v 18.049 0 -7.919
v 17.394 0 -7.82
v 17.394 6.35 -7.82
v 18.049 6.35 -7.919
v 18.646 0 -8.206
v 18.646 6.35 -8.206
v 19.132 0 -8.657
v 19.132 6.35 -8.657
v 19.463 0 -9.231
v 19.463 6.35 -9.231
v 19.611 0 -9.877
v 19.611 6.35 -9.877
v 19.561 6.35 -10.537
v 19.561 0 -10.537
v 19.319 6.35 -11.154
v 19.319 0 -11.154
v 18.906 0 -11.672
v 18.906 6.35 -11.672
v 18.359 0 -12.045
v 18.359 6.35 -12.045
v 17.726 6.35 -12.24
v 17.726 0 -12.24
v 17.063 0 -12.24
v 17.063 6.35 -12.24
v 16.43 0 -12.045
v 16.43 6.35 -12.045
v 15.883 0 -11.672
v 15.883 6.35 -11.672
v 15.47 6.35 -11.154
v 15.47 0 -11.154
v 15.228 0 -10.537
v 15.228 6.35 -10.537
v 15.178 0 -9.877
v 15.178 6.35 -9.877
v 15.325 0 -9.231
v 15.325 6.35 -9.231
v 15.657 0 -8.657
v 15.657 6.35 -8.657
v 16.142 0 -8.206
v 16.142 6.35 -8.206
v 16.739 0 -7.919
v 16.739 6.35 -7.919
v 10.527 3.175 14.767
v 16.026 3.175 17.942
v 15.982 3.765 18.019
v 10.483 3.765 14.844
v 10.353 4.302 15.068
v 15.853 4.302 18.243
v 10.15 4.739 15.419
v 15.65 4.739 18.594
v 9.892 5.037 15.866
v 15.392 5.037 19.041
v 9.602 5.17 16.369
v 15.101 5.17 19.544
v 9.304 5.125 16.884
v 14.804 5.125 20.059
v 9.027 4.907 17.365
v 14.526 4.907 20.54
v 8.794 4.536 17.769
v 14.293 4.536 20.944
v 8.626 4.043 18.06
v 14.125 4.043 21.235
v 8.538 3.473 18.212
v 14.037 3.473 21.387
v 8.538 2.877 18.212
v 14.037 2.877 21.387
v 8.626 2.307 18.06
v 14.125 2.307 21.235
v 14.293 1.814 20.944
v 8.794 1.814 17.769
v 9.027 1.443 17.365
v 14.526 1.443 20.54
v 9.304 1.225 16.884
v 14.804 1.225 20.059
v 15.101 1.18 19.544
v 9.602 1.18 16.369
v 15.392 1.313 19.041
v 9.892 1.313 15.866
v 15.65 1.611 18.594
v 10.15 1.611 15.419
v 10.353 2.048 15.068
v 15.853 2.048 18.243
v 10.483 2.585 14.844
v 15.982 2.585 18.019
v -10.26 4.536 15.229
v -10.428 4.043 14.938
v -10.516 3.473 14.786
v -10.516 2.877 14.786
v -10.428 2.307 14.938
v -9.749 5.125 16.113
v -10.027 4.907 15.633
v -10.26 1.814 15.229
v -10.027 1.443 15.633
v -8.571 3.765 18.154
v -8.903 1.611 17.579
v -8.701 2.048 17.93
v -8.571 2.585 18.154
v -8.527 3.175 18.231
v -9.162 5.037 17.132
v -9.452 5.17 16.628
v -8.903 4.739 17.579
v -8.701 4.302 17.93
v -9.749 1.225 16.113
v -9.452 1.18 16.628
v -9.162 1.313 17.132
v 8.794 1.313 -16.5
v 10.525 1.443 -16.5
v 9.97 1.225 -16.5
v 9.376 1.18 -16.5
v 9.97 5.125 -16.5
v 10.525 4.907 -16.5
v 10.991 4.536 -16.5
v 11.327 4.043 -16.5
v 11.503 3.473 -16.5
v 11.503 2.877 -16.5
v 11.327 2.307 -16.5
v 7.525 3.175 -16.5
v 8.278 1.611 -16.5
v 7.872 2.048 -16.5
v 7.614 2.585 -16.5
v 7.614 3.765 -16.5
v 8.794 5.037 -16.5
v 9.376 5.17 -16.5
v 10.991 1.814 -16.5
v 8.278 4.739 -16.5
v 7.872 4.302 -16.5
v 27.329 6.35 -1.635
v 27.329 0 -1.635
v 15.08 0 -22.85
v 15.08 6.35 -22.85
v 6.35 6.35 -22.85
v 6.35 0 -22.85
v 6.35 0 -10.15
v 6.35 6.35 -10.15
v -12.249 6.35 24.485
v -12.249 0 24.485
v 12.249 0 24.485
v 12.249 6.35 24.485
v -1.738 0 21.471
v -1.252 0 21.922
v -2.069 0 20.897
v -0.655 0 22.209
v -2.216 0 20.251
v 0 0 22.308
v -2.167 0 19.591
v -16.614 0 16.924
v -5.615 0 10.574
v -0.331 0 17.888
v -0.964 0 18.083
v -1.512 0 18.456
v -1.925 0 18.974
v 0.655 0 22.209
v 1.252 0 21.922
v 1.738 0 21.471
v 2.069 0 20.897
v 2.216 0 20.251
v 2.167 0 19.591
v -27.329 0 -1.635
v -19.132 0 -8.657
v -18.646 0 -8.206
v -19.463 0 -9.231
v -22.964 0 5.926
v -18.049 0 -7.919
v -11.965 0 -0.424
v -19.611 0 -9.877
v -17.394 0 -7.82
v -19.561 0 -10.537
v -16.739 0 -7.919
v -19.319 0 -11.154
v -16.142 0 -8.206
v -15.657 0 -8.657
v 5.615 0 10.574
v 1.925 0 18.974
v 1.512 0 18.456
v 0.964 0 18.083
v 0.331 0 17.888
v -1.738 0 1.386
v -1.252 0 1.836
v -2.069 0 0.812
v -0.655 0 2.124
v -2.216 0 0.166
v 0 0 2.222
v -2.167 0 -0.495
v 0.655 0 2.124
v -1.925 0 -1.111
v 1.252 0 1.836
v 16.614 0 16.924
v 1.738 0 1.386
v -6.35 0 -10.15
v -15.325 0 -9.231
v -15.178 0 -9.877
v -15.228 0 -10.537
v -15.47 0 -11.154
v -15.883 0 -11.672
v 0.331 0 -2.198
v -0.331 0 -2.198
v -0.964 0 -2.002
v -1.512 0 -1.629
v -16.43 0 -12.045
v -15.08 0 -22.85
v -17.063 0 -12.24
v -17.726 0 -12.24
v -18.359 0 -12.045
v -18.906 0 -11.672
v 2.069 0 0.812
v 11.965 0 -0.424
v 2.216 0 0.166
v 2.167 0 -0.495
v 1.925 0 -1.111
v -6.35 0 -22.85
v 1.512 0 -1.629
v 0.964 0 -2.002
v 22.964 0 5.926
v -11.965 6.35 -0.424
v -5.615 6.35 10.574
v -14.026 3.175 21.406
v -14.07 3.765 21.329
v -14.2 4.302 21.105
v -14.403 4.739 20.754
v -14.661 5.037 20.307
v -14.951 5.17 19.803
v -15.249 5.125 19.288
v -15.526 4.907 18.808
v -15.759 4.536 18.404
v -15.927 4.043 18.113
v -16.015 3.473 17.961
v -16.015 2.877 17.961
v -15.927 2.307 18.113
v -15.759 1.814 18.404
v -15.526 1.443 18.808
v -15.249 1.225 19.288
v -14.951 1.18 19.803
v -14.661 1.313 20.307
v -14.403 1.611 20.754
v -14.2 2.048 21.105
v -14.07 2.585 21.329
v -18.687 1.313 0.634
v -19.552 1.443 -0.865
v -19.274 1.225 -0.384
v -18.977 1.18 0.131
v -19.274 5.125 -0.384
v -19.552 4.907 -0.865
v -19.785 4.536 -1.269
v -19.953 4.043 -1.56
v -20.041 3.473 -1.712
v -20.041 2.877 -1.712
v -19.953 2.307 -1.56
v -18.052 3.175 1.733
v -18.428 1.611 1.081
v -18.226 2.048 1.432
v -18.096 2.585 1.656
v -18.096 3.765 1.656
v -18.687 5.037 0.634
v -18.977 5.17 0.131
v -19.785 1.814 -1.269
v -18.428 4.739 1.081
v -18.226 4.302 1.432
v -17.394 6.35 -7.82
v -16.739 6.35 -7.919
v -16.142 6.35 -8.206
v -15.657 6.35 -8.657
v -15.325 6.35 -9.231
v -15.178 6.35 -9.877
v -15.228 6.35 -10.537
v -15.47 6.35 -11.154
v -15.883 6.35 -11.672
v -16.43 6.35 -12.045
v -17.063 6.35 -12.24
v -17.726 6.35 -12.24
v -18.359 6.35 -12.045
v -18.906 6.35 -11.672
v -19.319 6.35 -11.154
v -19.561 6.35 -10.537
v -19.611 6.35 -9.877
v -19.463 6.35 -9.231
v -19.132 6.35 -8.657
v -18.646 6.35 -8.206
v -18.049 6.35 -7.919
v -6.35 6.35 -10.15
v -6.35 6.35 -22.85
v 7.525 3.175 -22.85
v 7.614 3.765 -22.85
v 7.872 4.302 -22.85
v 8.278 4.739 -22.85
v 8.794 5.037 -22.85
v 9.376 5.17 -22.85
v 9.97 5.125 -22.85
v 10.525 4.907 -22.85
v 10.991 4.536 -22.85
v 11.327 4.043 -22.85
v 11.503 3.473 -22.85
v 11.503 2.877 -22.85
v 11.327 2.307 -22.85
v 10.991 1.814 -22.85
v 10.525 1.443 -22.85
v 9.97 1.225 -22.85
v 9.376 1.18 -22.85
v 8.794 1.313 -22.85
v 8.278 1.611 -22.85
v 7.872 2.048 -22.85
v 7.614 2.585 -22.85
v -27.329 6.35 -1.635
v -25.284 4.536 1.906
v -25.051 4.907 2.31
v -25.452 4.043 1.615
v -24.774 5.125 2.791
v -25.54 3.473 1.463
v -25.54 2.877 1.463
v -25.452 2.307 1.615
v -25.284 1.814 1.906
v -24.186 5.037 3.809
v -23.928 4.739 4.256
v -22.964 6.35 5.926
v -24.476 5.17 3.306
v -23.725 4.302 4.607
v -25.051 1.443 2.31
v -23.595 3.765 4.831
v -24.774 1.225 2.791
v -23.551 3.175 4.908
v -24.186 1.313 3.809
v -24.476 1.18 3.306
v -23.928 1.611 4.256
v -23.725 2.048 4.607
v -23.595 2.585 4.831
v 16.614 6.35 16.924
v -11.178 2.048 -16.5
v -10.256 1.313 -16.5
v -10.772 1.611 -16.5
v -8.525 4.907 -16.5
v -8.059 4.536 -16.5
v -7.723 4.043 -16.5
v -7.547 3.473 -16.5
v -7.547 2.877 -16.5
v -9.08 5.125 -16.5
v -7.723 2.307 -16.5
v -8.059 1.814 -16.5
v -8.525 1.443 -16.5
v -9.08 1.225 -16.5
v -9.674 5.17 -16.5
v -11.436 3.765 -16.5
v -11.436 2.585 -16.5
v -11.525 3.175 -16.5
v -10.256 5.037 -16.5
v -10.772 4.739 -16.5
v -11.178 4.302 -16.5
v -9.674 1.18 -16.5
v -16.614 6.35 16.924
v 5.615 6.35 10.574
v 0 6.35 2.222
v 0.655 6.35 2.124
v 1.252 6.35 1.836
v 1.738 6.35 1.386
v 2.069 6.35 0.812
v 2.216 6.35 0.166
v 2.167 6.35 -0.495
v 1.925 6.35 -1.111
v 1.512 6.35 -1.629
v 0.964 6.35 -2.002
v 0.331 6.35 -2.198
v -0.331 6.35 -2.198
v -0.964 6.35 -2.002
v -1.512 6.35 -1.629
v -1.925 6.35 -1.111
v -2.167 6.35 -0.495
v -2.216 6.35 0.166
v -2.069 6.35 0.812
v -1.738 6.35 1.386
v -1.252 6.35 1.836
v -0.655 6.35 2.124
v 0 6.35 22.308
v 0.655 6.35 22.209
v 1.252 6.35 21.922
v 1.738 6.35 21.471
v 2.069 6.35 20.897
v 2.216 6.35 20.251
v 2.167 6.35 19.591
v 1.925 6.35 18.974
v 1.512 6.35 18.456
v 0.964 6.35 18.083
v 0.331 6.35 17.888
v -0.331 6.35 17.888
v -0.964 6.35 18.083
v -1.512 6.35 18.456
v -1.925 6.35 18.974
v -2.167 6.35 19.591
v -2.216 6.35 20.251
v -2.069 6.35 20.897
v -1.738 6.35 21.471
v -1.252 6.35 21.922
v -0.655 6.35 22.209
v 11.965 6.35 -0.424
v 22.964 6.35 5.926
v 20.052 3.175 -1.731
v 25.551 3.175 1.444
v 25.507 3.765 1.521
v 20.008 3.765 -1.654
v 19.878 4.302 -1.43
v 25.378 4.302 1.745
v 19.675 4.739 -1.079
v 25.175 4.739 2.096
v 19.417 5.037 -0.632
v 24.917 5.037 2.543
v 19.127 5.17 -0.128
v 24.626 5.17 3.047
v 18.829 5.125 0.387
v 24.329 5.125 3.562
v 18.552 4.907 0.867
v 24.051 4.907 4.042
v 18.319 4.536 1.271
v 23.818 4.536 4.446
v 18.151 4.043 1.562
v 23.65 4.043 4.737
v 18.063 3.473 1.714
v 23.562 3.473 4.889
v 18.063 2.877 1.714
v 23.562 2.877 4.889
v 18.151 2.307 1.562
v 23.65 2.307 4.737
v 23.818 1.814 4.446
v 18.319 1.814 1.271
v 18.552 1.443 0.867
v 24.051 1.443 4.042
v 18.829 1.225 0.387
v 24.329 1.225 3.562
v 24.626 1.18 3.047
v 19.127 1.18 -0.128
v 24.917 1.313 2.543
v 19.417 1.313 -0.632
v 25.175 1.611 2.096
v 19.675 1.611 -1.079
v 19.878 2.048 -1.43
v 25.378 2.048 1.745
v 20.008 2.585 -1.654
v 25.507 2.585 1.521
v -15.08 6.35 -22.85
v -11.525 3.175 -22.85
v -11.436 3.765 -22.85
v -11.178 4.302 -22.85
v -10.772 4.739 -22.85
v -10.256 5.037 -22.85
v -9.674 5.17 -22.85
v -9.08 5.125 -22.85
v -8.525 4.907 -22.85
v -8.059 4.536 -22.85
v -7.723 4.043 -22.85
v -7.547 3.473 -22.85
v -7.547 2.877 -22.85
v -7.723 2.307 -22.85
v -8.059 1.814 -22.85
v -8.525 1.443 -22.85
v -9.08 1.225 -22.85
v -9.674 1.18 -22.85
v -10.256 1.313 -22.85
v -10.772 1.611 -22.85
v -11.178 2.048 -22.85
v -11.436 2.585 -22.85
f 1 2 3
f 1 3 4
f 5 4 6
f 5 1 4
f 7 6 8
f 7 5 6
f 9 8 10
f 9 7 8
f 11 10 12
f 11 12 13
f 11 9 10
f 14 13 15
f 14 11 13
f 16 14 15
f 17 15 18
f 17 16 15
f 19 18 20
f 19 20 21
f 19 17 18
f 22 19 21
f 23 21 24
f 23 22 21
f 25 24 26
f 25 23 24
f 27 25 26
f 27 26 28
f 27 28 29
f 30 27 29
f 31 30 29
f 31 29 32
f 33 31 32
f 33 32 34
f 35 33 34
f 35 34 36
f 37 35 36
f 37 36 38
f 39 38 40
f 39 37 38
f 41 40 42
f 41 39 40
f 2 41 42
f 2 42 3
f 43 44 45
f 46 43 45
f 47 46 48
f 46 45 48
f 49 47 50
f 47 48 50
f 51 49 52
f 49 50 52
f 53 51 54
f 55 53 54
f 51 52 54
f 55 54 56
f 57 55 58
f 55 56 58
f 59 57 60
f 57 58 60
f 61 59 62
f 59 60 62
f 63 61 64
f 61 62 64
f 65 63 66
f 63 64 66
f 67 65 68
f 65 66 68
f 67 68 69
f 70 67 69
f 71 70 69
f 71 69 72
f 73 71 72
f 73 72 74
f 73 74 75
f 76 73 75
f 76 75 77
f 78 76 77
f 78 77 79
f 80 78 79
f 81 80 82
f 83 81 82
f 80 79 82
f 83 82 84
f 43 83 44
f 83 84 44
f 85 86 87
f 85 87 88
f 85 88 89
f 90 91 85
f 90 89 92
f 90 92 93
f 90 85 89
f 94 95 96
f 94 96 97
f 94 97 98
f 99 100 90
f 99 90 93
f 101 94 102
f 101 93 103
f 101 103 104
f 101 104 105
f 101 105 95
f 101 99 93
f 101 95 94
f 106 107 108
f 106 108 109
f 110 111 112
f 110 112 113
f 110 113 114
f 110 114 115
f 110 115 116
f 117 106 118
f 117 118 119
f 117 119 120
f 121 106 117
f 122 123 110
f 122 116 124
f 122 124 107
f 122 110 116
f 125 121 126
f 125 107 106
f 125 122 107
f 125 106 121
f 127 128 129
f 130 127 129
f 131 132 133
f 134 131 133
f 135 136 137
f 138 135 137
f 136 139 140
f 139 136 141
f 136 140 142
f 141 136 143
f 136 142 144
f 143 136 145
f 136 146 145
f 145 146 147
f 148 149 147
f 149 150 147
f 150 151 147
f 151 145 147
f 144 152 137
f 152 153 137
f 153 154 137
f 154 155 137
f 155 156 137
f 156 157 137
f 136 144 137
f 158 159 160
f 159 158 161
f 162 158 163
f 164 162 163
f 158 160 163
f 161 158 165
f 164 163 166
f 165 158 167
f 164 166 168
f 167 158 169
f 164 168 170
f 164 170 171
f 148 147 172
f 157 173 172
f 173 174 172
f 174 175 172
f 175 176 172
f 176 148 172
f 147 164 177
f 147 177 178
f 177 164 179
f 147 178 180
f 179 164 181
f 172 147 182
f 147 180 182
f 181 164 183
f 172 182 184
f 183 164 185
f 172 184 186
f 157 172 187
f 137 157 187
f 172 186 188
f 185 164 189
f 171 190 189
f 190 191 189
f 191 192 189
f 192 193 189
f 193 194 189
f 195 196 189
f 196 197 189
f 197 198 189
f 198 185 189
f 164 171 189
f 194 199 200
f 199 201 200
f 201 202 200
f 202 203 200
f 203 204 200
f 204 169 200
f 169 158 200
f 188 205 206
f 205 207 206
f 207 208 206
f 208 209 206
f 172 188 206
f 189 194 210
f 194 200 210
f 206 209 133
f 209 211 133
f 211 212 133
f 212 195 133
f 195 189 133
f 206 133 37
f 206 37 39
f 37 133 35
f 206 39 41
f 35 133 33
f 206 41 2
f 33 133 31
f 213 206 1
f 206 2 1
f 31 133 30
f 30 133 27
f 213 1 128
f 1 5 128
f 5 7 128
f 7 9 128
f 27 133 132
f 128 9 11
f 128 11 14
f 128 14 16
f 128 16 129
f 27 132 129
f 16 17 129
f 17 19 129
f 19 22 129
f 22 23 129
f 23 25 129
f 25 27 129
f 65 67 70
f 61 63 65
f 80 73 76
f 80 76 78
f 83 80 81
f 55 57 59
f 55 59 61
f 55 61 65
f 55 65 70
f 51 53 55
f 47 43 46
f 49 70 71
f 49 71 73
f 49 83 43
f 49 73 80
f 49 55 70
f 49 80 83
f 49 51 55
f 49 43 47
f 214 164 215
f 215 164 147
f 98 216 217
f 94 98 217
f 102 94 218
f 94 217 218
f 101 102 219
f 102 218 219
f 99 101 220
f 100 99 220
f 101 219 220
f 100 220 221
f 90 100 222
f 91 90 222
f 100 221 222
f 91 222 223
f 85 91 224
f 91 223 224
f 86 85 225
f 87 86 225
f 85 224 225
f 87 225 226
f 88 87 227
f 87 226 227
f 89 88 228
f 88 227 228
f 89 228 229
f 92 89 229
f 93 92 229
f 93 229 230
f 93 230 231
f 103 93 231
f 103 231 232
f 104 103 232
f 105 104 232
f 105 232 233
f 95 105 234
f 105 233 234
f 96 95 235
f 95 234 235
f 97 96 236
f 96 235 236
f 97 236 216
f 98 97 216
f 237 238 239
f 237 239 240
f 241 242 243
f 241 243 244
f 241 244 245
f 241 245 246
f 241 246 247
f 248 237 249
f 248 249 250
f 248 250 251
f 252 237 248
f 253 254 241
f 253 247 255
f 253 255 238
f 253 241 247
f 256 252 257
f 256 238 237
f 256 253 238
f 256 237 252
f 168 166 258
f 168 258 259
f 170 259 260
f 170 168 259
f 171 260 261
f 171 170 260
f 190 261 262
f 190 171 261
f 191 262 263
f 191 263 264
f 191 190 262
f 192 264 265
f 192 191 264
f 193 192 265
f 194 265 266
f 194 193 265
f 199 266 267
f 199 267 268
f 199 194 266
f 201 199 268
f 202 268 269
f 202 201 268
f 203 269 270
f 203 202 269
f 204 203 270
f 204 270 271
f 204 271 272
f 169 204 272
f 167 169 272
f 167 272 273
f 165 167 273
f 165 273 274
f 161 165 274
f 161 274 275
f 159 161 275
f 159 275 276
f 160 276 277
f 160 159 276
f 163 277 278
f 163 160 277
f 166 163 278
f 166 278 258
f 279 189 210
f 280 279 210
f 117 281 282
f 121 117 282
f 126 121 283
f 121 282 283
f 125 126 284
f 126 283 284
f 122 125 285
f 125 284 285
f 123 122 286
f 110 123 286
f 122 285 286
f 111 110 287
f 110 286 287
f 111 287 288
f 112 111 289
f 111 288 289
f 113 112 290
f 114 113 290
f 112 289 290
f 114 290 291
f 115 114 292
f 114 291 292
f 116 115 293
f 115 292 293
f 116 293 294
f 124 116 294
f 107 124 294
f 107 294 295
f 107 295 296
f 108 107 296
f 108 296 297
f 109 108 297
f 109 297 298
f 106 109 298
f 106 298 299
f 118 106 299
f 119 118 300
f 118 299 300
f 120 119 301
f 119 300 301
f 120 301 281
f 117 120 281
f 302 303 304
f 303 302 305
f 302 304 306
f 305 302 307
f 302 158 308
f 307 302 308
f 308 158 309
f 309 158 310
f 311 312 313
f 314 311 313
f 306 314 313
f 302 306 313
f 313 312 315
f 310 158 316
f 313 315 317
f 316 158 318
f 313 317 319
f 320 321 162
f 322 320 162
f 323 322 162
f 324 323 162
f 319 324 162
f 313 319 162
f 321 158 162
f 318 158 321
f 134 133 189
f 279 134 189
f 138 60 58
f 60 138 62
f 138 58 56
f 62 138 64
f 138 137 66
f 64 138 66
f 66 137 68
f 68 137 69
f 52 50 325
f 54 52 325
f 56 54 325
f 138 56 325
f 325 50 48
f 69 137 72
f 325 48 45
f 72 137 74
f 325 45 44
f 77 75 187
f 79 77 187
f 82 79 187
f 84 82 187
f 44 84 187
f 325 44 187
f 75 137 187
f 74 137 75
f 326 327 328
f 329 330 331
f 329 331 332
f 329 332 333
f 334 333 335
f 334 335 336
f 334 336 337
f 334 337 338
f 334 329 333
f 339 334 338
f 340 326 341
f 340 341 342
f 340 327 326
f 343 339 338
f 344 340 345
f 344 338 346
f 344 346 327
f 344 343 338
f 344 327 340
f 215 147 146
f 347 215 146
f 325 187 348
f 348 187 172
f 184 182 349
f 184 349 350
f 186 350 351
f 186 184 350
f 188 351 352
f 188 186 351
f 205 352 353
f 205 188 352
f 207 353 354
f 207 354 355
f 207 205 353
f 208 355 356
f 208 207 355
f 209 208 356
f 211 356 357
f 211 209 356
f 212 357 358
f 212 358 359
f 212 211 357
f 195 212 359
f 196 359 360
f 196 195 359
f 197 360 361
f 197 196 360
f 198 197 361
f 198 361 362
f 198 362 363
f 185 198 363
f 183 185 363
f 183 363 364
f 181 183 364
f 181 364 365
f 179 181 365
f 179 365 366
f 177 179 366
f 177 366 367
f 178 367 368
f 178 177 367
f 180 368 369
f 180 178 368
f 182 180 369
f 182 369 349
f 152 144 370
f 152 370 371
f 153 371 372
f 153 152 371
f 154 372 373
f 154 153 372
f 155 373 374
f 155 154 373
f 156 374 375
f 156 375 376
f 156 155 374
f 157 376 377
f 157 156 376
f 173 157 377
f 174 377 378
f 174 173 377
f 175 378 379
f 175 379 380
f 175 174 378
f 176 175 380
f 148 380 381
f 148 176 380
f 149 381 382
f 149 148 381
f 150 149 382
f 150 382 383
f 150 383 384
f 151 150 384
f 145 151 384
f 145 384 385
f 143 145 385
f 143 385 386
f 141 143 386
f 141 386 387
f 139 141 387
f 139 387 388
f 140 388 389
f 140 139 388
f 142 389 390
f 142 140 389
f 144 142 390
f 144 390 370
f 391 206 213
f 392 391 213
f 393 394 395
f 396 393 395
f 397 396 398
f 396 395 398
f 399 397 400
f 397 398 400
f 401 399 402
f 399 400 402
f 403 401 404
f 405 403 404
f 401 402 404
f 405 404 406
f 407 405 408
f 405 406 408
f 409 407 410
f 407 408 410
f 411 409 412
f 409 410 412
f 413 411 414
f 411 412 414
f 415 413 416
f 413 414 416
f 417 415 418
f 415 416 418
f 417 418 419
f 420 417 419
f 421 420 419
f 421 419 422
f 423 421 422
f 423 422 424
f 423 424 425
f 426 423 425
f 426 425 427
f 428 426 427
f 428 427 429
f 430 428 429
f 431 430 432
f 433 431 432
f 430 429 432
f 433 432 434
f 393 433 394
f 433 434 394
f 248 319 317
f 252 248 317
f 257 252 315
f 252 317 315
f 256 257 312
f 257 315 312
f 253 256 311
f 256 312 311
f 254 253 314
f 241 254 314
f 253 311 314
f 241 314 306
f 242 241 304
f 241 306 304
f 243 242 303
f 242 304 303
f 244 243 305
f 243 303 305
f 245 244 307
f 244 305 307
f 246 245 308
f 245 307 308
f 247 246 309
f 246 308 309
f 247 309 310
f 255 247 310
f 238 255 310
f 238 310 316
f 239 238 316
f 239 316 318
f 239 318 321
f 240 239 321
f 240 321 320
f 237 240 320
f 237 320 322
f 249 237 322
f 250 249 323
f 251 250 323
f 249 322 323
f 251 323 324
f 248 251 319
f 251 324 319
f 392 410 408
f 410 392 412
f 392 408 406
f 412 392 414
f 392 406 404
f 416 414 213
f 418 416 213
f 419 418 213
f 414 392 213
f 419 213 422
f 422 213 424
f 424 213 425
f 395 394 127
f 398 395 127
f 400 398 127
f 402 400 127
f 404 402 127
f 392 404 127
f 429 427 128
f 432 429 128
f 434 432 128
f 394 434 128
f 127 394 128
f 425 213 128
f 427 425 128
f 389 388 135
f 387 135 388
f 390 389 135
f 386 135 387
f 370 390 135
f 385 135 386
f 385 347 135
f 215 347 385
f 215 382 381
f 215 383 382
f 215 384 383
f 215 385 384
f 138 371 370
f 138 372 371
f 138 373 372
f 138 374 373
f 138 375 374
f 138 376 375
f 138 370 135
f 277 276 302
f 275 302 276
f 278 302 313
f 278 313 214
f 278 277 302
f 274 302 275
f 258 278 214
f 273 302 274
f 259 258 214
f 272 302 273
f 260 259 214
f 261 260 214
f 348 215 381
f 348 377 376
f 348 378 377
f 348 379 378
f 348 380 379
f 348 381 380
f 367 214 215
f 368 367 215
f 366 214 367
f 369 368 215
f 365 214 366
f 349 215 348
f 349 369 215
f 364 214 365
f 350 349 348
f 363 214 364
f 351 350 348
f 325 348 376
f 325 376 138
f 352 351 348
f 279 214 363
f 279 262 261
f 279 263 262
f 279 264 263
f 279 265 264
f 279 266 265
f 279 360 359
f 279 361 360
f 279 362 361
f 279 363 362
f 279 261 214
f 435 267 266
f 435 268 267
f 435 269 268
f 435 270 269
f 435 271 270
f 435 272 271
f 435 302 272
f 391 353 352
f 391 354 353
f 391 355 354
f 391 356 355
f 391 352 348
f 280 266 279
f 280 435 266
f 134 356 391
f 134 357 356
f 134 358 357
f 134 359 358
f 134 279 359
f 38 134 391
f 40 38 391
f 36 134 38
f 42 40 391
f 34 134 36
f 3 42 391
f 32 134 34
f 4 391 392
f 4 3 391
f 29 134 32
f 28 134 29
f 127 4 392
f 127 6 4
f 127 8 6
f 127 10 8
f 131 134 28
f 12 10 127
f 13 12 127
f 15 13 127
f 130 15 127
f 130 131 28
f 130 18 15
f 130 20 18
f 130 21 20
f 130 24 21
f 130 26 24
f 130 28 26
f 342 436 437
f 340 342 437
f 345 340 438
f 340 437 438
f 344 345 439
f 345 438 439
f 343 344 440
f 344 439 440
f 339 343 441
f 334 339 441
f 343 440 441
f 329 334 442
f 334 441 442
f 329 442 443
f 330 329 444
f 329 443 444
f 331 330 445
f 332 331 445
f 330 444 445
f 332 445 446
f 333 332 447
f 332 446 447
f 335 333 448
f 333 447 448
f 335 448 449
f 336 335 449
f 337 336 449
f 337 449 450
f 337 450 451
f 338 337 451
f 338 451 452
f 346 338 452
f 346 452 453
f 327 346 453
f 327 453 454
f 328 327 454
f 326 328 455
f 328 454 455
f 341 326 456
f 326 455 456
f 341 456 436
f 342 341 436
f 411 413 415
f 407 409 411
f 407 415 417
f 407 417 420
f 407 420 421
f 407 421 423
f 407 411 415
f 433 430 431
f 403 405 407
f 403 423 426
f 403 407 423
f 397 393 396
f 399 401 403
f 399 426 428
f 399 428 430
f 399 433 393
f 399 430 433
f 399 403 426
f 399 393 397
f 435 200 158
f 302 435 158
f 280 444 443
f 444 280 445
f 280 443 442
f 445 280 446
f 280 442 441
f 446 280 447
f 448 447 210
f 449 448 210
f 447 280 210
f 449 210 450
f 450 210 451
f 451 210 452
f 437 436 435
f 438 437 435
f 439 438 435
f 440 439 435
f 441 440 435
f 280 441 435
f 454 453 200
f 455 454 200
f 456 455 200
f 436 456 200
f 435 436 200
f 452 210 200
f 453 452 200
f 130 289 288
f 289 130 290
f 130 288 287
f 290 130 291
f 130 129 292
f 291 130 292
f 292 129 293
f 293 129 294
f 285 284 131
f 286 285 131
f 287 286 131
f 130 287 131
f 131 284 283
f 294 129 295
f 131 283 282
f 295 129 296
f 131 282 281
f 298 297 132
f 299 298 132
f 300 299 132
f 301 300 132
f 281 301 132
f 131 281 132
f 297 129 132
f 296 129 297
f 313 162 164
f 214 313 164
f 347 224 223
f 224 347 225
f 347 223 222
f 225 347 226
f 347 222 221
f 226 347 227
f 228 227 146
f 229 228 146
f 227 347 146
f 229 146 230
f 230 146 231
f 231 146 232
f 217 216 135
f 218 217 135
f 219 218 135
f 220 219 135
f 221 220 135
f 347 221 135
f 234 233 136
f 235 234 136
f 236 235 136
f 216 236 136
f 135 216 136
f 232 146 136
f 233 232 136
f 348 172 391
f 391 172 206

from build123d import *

# Parameters (mm, degrees)
SKETCH1_R           = 2.2225
BOSS_EXTRUDE3_DEPTH = 6.35
CUT_EXTRUDE1_DEPTH  = 6.35
SKETCH3_R           = 2.00025
CUT_EXTRUDE2_DEPTH  = 6.35
SKETCH4_R           = 2.00025
CUT_EXTRUDE3_DEPTH  = 6.35


with BuildPart() as part:
    # Sketch1 → Boss-Extrude3 (new body)
    with BuildSketch(Plane(origin=(0, 0, 0), x_dir=(1, 0, 0), z_dir=(0, 1, 0))):
        Polygon((-6.35, 10.15), (-6.35, 22.85), (-15.08, 22.85), (-27.328680476, 1.634663089), (-22.963680476, -5.925738686), (-11.965157848, 0.424261314), (-5.615157848, -10.574261314), (-16.613680476, -16.924261314), (-12.248680476, -24.484663089), (12.248680476, -24.484663089), (16.613680476, -16.924261314), (5.615157848, -10.574261314), (11.965157848, 0.424261314), (22.963680476, -5.925738686), (27.328680476, 1.634663089), (15.08, 22.85), (6.35, 22.85), (6.35, 10.15), align=None)
        with Locations(Location((0, -20.085254038, 0), (0, 0, 270))):
            Circle(SKETCH1_R, mode=Mode.SUBTRACT)
        with Locations(Location((17.394340238, 10.042627019, 0), (0, 0, 270))):
            Circle(SKETCH1_R, mode=Mode.SUBTRACT)
        with Locations(Location((-17.394340238, 10.042627019, 0), (0, 0, 270))):
            Circle(SKETCH1_R, mode=Mode.SUBTRACT)
        with Locations(Location((0, 0, 0), (0, 0, 270))):
            Circle(SKETCH1_R, mode=Mode.SUBTRACT)
    extrude(amount=BOSS_EXTRUDE3_DEPTH)

    # Sketch2 → Cut-Extrude1 (cut)
    with BuildSketch(Plane(origin=(19.788680476, 0, 11.425), x_dir=(0.5000000000000057, 0, -0.8660254037844354), z_dir=(0.8660254037844354, 0, 0.5000000000000057))):
        with BuildLine():
            ThreePointArc((-11.52525, 3.175), (-9.525, 1.17475), (-7.52475, 3.175))
            Line((-7.52475, 3.175), (-11.52525, 3.175))
        make_face()
        with BuildLine():
            Line((-11.52525, 3.175), (-7.52475, 3.175))
            ThreePointArc((-7.52475, 3.175), (-9.525, 5.17525), (-11.52525, 3.175))
        make_face()
        with BuildLine():
            ThreePointArc((7.52475, 3.175), (9.525, 1.17475), (11.52525, 3.175))
            Line((11.52525, 3.175), (7.52475, 3.175))
        make_face()
        with BuildLine():
            Line((7.52475, 3.175), (11.52525, 3.175))
            ThreePointArc((11.52525, 3.175), (9.525, 5.17525), (7.52475, 3.175))
        make_face()
    extrude(amount=-CUT_EXTRUDE1_DEPTH, mode=Mode.SUBTRACT)

    # Sketch3 → Cut-Extrude2 (cut)
    with BuildSketch(Plane(origin=(-19.788680476, 0, 11.425), x_dir=(0.5000000000000099, 0, 0.866025403784433), z_dir=(-0.8660254037844329, 0, 0.5000000000000098))):
        with Locations((-9.525, 3.175)):
            Circle(SKETCH3_R)
        with Locations((9.525, 3.175)):
            Circle(SKETCH3_R)
    extrude(amount=-CUT_EXTRUDE2_DEPTH, mode=Mode.SUBTRACT)

    # Sketch4 → Cut-Extrude3 (cut)
    with BuildSketch(Plane(origin=(0, 0, -22.85), x_dir=(-1, 0, 0), z_dir=(0, 0, -1))):
        with Locations((-9.525, 3.175)):
            Circle(SKETCH4_R)
        with Locations((9.525, 3.175)):
            Circle(SKETCH4_R)
    extrude(amount=-CUT_EXTRUDE3_DEPTH, mode=Mode.SUBTRACT)


solid = part.part
